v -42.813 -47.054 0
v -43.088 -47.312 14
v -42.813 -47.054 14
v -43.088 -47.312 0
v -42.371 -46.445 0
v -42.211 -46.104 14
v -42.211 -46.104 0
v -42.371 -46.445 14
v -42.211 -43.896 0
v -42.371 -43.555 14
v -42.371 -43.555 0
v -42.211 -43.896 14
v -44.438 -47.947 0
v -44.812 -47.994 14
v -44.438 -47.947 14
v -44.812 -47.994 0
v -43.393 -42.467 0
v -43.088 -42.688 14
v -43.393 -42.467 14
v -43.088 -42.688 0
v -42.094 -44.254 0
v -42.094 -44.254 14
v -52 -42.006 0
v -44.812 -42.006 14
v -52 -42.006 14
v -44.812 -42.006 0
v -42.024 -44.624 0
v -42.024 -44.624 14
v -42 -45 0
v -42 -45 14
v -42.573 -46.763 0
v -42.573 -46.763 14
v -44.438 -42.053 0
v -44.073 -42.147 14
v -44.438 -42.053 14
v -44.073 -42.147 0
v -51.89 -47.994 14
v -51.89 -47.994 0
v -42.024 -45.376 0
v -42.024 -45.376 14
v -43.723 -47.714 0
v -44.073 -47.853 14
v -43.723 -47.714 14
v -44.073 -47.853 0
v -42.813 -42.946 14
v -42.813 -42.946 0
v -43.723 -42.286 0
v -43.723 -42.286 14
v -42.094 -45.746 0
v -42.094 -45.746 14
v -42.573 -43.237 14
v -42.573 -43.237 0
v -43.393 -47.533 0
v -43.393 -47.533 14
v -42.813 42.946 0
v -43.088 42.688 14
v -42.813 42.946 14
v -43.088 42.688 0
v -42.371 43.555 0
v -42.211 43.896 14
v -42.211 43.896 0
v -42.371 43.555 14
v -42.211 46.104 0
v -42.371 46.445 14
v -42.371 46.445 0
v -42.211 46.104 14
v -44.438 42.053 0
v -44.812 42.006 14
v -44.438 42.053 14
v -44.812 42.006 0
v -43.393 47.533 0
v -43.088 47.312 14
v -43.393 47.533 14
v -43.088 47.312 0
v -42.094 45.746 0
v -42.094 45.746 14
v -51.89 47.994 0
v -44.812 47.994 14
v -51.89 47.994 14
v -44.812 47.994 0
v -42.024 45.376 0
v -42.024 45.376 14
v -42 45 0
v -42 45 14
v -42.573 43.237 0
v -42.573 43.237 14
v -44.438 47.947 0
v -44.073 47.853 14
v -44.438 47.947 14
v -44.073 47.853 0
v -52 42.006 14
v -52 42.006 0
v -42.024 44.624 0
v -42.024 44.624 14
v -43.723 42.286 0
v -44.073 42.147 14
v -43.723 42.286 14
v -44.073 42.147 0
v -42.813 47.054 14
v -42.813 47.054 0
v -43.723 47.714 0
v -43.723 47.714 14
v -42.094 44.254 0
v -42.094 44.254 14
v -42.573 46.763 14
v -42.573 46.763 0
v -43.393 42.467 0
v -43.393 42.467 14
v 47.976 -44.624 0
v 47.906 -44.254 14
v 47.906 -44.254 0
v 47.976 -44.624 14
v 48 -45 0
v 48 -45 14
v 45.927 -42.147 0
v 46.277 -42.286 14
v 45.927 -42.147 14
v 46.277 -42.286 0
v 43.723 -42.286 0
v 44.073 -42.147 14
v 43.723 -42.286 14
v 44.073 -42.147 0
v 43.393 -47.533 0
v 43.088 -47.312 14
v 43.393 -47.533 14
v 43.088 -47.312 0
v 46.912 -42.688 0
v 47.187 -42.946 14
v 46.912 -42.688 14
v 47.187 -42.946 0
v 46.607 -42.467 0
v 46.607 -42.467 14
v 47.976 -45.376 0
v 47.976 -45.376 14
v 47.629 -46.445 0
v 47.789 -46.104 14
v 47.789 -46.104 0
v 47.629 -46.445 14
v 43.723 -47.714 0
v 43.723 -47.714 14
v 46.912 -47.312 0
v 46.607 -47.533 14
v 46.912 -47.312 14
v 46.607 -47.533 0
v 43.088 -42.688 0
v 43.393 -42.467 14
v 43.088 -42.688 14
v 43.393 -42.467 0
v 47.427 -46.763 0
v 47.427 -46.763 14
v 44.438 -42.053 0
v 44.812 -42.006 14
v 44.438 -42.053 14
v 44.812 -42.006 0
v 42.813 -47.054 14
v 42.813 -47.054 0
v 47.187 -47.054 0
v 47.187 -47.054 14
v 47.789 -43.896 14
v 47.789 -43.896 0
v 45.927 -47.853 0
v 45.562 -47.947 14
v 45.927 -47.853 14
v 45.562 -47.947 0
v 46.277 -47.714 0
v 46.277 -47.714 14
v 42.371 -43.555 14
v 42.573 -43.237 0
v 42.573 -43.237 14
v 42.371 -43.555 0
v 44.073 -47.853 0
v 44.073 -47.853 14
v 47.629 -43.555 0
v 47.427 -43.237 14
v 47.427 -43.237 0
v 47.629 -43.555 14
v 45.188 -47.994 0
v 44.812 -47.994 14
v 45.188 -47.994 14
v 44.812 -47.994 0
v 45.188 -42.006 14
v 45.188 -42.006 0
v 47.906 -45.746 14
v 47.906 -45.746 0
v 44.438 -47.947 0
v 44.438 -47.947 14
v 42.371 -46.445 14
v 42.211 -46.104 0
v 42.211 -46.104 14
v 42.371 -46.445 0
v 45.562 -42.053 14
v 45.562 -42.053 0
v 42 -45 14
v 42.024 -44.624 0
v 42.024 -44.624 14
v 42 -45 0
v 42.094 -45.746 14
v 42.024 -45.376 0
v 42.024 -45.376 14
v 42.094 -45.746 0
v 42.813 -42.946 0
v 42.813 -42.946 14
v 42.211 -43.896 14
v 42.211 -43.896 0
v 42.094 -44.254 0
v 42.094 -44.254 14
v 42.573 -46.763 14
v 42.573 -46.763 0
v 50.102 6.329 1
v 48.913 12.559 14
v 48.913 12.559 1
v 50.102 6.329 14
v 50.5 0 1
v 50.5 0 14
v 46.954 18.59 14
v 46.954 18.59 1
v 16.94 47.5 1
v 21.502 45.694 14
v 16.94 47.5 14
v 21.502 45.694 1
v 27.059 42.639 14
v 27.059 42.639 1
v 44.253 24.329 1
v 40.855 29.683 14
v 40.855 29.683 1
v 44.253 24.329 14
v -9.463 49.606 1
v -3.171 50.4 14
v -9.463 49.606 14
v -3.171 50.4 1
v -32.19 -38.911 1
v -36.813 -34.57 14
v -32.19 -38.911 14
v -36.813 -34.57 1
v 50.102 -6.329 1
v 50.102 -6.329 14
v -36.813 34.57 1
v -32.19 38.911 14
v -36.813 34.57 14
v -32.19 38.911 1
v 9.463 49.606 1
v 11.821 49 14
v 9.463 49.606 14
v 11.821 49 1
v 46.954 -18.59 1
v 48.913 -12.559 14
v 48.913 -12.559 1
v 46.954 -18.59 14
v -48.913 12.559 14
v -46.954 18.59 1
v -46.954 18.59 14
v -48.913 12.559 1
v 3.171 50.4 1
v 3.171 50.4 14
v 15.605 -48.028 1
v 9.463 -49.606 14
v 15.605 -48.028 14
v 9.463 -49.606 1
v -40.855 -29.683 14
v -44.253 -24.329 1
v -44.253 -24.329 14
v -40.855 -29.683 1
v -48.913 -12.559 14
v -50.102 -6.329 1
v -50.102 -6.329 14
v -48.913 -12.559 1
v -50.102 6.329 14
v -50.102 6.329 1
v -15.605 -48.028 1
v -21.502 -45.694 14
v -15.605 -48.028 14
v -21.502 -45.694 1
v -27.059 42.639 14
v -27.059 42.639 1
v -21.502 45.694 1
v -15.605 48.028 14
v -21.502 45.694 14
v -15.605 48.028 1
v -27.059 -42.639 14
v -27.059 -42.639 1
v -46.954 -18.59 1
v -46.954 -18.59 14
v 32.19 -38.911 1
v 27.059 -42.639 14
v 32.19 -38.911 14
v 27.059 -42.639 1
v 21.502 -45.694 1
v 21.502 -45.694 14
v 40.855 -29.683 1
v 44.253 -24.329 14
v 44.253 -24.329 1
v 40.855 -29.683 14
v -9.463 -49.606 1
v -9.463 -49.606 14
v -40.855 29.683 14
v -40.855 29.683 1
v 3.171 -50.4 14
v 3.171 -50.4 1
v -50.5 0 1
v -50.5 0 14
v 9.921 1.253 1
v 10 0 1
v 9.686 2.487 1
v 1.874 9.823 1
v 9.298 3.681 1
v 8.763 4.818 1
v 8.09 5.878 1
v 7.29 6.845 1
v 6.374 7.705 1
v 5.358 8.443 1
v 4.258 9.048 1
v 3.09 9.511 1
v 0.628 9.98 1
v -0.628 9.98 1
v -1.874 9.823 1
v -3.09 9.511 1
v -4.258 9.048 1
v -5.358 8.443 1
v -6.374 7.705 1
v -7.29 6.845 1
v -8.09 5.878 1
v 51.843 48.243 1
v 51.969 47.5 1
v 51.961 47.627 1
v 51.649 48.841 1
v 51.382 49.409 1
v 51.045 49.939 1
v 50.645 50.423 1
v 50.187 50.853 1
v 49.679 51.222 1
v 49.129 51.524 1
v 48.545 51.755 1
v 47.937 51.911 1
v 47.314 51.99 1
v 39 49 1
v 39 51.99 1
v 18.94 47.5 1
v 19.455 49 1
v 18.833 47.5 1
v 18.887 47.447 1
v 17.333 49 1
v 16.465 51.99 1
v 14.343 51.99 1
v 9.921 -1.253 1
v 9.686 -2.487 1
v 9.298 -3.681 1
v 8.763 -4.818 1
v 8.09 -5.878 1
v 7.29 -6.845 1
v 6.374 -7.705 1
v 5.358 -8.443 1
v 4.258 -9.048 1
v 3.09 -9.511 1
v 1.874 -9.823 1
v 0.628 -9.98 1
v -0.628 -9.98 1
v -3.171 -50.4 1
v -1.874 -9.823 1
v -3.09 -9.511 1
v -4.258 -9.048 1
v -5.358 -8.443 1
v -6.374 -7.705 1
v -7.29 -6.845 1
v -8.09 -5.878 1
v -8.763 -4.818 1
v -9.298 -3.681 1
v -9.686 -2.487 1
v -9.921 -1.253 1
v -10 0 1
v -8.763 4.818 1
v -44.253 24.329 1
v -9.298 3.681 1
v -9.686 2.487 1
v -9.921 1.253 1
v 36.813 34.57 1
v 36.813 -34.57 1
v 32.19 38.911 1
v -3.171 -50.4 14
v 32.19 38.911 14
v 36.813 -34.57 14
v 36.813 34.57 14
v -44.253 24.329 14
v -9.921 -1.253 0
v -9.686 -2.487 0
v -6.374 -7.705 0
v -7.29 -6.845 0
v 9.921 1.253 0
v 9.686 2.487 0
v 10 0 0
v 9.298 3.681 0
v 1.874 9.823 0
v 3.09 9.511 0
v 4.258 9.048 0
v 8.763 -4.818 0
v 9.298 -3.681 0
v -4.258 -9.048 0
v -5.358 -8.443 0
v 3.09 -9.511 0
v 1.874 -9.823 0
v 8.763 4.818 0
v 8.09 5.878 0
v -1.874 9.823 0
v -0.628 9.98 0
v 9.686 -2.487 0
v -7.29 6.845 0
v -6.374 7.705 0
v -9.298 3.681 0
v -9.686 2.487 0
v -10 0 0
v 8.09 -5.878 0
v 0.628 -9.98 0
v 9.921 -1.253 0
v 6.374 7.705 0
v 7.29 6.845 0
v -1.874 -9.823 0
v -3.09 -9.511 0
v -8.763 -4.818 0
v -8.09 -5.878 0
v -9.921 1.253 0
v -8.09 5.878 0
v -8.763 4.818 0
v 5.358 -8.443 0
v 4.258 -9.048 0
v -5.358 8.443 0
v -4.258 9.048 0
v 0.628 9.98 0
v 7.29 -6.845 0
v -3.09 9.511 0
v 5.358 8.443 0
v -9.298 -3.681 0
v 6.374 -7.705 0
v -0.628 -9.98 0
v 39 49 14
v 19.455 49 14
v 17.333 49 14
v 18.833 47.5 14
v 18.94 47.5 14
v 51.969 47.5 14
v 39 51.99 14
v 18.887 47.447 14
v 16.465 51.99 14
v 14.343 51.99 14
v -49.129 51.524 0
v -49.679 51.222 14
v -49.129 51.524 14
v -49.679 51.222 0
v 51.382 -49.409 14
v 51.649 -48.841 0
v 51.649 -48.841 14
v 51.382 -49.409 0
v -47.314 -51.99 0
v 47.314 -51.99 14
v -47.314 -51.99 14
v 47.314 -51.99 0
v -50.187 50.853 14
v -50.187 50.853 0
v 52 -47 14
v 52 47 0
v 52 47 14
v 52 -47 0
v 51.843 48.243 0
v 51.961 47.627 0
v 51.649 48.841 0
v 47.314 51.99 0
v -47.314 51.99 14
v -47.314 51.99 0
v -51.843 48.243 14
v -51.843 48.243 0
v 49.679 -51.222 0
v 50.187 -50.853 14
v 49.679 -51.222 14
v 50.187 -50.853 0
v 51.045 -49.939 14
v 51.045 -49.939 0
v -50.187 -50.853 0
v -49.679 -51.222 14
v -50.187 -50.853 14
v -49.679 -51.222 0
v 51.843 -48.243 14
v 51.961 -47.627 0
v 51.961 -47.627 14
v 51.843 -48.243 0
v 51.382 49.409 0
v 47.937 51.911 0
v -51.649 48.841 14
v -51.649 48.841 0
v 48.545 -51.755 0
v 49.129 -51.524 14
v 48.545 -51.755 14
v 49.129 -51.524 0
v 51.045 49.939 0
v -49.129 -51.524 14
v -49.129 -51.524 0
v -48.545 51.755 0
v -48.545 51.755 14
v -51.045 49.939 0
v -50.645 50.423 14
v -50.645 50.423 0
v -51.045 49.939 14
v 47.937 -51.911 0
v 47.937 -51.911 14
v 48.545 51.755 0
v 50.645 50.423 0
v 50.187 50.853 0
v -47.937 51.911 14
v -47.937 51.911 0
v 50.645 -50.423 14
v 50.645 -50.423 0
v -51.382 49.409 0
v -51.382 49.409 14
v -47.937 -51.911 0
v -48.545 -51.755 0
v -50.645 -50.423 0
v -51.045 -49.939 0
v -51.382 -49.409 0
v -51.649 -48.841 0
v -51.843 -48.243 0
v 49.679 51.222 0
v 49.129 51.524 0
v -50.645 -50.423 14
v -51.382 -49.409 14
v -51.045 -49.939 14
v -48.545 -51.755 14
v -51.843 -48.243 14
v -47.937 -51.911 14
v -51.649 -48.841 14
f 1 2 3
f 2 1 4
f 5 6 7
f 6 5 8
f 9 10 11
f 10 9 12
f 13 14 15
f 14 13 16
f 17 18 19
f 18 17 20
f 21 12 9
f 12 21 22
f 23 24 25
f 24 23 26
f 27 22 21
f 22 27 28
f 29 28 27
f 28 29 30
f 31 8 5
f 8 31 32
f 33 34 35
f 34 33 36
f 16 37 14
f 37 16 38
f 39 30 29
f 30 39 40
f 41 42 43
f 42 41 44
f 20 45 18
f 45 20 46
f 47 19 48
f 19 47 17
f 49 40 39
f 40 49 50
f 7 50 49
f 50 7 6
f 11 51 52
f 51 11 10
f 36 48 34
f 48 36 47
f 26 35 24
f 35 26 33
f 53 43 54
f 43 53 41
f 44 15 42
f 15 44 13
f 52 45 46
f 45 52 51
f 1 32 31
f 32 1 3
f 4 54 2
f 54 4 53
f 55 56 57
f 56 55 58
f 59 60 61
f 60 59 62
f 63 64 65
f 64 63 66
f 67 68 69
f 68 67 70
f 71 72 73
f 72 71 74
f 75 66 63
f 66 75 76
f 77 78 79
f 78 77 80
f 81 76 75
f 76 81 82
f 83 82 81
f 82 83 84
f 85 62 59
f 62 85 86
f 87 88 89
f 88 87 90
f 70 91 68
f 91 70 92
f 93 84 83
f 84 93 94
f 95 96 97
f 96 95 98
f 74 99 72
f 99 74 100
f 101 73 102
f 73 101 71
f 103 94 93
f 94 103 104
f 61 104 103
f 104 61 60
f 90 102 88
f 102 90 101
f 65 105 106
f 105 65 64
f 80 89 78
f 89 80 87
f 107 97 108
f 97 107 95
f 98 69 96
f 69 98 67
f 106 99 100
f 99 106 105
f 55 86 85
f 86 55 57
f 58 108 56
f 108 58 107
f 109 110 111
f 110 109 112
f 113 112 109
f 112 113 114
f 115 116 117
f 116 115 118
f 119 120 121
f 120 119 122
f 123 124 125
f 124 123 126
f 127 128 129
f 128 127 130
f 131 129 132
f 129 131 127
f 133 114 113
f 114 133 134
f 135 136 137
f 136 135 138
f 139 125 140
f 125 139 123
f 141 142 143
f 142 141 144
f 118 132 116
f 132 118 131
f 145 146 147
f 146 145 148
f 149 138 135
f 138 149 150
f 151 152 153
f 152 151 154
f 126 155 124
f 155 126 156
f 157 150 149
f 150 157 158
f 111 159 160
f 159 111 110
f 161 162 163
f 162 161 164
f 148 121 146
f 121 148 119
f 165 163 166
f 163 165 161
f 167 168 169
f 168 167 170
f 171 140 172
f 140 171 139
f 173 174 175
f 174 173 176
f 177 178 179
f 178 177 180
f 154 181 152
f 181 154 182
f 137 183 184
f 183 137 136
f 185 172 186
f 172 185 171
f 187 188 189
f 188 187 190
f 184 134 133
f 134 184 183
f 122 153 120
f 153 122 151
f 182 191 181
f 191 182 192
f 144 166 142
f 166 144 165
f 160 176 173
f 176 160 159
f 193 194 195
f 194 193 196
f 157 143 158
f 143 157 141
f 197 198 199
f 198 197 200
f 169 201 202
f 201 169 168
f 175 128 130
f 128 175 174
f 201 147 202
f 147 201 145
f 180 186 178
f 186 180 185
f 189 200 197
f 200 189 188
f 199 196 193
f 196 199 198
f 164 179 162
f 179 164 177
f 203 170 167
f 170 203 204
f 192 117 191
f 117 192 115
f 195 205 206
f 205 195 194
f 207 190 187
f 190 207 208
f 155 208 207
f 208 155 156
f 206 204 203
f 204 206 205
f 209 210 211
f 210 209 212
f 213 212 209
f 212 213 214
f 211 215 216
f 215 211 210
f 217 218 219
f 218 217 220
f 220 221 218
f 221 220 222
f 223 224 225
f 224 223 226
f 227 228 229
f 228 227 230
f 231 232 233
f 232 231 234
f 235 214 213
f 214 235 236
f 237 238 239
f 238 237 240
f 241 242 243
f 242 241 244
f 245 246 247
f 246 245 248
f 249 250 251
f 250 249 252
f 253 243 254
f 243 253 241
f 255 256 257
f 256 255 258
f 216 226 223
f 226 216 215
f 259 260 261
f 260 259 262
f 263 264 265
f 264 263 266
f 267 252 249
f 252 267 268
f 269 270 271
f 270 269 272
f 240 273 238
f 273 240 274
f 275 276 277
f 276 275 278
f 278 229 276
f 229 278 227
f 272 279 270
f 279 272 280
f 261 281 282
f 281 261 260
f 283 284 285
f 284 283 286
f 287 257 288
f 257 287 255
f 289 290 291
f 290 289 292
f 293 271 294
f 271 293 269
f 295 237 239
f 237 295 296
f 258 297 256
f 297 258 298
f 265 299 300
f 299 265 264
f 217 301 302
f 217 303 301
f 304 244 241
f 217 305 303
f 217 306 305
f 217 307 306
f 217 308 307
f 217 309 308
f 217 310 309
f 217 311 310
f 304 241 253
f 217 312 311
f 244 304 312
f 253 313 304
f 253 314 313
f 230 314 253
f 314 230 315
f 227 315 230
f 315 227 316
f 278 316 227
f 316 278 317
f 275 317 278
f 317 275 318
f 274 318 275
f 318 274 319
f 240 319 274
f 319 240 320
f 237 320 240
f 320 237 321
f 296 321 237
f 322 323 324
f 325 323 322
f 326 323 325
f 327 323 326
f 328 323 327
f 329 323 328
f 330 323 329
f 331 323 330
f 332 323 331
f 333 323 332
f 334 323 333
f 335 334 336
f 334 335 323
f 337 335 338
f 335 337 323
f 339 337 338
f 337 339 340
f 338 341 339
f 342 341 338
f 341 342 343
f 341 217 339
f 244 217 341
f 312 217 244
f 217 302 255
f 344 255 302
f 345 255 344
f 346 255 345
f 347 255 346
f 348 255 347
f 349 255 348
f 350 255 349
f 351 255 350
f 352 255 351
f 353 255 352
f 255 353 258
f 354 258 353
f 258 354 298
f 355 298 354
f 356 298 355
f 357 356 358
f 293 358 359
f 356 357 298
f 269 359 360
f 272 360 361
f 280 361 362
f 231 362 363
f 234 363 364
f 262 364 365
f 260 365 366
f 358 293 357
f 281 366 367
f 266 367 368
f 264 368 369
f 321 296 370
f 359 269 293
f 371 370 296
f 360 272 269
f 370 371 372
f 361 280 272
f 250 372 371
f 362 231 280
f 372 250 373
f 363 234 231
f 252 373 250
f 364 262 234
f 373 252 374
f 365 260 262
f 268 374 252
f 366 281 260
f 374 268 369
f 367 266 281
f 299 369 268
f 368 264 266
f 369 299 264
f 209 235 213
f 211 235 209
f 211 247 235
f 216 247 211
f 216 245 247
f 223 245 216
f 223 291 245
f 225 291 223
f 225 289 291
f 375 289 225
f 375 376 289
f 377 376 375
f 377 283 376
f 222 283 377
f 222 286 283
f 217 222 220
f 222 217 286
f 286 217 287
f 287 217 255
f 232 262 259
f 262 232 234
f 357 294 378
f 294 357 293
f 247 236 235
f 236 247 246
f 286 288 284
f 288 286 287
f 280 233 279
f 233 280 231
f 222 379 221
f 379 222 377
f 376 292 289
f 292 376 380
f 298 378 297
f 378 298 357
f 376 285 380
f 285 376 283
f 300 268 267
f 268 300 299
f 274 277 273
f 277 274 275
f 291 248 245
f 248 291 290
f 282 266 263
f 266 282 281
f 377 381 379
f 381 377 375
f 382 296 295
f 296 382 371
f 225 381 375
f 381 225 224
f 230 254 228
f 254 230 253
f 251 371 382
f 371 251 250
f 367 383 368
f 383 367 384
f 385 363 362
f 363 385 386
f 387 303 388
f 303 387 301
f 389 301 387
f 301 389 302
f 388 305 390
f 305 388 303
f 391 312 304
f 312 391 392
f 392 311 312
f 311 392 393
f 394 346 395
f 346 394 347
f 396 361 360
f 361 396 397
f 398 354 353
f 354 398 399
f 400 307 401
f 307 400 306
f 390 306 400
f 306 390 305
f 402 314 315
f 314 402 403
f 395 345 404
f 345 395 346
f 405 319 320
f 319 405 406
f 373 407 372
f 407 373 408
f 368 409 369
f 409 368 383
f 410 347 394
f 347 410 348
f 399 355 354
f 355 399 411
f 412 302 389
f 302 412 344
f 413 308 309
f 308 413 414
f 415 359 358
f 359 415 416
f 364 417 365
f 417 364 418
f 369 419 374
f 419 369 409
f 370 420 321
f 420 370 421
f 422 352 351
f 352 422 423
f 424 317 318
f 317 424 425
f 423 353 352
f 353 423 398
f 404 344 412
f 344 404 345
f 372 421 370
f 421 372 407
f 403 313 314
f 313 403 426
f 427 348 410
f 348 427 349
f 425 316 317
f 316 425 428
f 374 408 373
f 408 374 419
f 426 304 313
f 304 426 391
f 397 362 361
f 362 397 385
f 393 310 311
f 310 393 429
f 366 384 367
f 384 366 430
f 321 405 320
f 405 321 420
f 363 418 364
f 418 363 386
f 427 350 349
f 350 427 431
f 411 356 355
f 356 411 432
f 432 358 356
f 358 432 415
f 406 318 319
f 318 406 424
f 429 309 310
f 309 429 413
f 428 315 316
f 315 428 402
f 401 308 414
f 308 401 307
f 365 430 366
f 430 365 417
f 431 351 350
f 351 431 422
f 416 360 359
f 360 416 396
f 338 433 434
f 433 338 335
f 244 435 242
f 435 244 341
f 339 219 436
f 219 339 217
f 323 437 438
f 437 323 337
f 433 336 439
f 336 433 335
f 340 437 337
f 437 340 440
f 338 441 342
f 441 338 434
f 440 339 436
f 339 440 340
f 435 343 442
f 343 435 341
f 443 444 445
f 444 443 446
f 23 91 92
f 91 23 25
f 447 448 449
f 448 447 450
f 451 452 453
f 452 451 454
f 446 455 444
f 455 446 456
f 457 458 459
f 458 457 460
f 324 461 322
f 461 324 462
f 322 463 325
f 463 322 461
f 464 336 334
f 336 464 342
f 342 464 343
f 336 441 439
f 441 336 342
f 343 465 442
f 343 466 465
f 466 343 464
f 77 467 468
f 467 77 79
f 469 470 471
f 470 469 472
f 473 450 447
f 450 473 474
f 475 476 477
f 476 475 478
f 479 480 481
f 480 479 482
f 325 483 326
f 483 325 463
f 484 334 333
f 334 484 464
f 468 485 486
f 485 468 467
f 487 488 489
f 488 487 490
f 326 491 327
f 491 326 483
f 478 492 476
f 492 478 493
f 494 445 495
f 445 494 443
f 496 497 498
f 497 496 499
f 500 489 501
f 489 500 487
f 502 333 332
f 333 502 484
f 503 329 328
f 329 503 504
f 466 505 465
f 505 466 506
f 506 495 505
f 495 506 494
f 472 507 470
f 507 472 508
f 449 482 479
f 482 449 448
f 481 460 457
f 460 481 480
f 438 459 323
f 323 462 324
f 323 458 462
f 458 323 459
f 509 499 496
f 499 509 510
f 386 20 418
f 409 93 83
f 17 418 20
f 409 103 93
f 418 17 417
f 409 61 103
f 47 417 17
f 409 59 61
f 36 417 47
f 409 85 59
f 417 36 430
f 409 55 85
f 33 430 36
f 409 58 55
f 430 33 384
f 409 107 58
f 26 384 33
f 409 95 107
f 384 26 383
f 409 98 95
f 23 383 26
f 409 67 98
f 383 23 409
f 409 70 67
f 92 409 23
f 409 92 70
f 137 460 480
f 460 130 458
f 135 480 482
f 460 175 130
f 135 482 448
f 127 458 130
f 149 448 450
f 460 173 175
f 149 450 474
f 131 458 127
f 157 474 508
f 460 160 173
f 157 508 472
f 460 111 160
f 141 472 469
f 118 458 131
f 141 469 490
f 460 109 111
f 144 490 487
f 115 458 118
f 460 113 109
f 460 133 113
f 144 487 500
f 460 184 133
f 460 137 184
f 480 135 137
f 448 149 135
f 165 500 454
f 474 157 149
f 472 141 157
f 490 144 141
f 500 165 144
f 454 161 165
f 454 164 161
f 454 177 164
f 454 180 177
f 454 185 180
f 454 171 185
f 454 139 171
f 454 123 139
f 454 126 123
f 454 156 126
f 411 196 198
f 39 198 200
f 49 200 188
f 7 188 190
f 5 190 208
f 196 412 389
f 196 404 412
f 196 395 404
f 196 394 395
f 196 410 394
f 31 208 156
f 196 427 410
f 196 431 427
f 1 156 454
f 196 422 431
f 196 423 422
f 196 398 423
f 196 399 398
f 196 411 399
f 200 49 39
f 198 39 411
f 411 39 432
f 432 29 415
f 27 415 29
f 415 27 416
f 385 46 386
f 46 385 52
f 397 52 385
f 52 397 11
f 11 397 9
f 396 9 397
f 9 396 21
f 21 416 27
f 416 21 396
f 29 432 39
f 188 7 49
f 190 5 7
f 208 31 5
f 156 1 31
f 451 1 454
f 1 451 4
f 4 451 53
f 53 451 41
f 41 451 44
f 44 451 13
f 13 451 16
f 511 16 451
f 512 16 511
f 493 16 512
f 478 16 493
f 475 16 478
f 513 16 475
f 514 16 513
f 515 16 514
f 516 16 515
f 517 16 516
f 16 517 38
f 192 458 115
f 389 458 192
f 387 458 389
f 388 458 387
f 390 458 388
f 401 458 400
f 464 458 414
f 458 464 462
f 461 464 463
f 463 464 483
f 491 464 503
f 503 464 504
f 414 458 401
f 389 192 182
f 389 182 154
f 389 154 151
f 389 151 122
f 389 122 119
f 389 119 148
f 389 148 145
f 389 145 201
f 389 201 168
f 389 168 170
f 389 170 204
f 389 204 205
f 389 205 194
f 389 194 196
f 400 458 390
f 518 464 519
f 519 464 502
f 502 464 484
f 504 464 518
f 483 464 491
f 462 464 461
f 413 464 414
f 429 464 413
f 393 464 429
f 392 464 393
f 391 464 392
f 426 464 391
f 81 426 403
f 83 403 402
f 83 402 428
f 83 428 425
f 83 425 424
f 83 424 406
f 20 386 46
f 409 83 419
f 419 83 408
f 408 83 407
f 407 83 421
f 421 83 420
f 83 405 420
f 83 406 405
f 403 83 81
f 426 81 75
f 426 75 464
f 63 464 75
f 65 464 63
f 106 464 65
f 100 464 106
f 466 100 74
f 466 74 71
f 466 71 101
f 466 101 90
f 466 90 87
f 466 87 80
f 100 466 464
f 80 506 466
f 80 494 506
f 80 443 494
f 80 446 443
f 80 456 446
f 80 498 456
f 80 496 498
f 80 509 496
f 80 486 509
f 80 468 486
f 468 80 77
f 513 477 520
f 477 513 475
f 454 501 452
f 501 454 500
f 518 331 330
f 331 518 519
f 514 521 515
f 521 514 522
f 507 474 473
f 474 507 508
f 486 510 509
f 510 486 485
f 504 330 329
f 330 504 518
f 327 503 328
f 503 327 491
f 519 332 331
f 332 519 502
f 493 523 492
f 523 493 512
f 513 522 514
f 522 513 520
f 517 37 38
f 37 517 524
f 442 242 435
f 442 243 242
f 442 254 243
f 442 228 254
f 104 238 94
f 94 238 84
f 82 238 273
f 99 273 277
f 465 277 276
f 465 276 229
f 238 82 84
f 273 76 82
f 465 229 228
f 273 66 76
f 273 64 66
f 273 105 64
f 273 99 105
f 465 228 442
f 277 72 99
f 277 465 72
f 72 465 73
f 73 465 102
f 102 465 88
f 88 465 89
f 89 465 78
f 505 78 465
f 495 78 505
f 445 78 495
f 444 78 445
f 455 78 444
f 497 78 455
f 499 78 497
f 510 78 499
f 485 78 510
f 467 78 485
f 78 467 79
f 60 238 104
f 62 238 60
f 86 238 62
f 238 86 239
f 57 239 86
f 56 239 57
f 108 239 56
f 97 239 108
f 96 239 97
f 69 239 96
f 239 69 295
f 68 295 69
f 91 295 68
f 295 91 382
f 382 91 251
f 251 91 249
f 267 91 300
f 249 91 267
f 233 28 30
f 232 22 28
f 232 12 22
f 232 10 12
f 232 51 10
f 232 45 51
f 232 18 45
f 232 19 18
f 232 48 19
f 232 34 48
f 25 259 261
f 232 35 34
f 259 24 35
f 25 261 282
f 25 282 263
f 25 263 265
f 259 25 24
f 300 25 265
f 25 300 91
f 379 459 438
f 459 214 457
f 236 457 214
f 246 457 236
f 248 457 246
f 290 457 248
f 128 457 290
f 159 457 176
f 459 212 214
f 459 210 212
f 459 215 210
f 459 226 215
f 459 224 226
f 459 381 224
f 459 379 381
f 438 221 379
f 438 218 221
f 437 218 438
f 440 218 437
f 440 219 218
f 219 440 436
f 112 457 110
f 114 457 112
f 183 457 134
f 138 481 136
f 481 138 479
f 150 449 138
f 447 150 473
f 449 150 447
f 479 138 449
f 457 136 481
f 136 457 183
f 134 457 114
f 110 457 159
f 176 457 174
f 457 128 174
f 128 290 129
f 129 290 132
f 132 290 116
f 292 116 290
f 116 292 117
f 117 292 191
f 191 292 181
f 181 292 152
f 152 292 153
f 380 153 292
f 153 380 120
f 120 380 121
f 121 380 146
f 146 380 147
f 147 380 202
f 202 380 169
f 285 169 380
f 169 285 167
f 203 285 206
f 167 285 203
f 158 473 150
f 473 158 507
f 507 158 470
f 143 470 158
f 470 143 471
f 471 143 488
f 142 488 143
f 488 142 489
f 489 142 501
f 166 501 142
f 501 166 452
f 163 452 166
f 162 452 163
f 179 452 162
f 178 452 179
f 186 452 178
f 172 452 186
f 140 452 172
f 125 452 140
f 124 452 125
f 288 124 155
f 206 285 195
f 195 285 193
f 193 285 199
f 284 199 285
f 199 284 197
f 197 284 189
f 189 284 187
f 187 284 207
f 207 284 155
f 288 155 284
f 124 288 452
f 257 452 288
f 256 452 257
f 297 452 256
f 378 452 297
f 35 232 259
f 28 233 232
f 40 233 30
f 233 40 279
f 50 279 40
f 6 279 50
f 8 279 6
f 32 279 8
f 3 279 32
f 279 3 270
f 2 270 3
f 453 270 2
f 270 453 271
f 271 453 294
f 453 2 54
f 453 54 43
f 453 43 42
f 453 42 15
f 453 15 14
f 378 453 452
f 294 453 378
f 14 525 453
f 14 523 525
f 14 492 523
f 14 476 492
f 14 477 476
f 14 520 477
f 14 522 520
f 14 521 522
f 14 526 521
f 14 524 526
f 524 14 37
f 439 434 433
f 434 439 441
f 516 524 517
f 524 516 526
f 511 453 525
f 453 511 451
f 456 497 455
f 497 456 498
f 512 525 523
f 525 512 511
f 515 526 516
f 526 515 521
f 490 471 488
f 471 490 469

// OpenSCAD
$fn = 50;


difference() {
	union() {
		translate(v = [0, 0, 0]) {
			rotate(a = [0, 0, 0]) {
				hull() {
					translate(v = [-47.0000000000, 47.0000000000, 0]) {
						rotate(a = [0, 0, 0]) {
							translate(v = [0, 0, 0]) {
								rotate(a = [0, 0, 0]) {
									cylinder(h = 14, r = 5);
								}
							}
						}
					}
					translate(v = [47.0000000000, 47.0000000000, 0]) {
						rotate(a = [0, 0, 0]) {
							translate(v = [0, 0, 0]) {
								rotate(a = [0, 0, 0]) {
									cylinder(h = 14, r = 5);
								}
							}
						}
					}
					translate(v = [-47.0000000000, -47.0000000000, 0]) {
						rotate(a = [0, 0, 0]) {
							translate(v = [0, 0, 0]) {
								rotate(a = [0, 0, 0]) {
									cylinder(h = 14, r = 5);
								}
							}
						}
					}
					translate(v = [47.0000000000, -47.0000000000, 0]) {
						rotate(a = [0, 0, 0]) {
							translate(v = [0, 0, 0]) {
								rotate(a = [0, 0, 0]) {
									cylinder(h = 14, r = 5);
								}
							}
						}
					}
				}
			}
		}
	}
	union() {
		translate(v = [-52.5000000000, -45.0000000000, -125]) {
			rotate(a = [0, 0, 0]) {
				hull() {
					translate(v = [7.5000000000, 0, 0]) {
						rotate(a = [0, 0, 0]) {
							translate(v = [0, 0, 0]) {
								rotate(a = [0, 0, 0]) {
									cylinder(h = 250, r = 3.0000000000);
								}
							}
						}
					}
					translate(v = [-7.5000000000, 0, 0]) {
						rotate(a = [0, 0, 0]) {
							translate(v = [0, 0, 0]) {
								rotate(a = [0, 0, 0]) {
									cylinder(h = 250, r = 3.0000000000);
								}
							}
						}
					}
				}
			}
		}
		translate(v = [-52.5000000000, 45.0000000000, -125]) {
			rotate(a = [0, 0, 0]) {
				hull() {
					translate(v = [7.5000000000, 0, 0]) {
						rotate(a = [0, 0, 0]) {
							translate(v = [0, 0, 0]) {
								rotate(a = [0, 0, 0]) {
									cylinder(h = 250, r = 3.0000000000);
								}
							}
						}
					}
					translate(v = [-7.5000000000, 0, 0]) {
						rotate(a = [0, 0, 0]) {
							translate(v = [0, 0, 0]) {
								rotate(a = [0, 0, 0]) {
									cylinder(h = 250, r = 3.0000000000);
								}
							}
						}
					}
				}
			}
		}
		translate(v = [45.0000000000, -45.0000000000, -125.0000000000]) {
			rotate(a = [0, 0, 0]) {
				cylinder(h = 250, r = 3.0000000000);
			}
		}
		translate(v = [0, 0, 1.0000000000]) {
			rotate(a = [0, 0, 0]) {
				cylinder(h = 16, r = 50.5000000000);
			}
		}
		translate(v = [0, 0, -7.0000000000]) {
			rotate(a = [0, 0, 0]) {
				cylinder(h = 14, r = 10.0000000000);
			}
		}
		translate(v = [0.0000000000, 47.5000000000, 1]) {
			rotate(a = [0, 0, 0]) {
				cube(size = [52.0000000000, 1.5000000000, 16]);
			}
		}
		translate(v = [39.0000000000, 47.5000000000, 1]) {
			rotate(a = [0, 0, 0]) {
				cube(size = [13.0000000000, 4.5000000000, 16]);
			}
		}
		translate(v = [13.5833333333, 52.7500000000, 1]) {
			rotate(a = [0, 0, -45]) {
				cube(size = [7.5000000000, 1.5000000000, 16]);
			}
		}
	}
}
